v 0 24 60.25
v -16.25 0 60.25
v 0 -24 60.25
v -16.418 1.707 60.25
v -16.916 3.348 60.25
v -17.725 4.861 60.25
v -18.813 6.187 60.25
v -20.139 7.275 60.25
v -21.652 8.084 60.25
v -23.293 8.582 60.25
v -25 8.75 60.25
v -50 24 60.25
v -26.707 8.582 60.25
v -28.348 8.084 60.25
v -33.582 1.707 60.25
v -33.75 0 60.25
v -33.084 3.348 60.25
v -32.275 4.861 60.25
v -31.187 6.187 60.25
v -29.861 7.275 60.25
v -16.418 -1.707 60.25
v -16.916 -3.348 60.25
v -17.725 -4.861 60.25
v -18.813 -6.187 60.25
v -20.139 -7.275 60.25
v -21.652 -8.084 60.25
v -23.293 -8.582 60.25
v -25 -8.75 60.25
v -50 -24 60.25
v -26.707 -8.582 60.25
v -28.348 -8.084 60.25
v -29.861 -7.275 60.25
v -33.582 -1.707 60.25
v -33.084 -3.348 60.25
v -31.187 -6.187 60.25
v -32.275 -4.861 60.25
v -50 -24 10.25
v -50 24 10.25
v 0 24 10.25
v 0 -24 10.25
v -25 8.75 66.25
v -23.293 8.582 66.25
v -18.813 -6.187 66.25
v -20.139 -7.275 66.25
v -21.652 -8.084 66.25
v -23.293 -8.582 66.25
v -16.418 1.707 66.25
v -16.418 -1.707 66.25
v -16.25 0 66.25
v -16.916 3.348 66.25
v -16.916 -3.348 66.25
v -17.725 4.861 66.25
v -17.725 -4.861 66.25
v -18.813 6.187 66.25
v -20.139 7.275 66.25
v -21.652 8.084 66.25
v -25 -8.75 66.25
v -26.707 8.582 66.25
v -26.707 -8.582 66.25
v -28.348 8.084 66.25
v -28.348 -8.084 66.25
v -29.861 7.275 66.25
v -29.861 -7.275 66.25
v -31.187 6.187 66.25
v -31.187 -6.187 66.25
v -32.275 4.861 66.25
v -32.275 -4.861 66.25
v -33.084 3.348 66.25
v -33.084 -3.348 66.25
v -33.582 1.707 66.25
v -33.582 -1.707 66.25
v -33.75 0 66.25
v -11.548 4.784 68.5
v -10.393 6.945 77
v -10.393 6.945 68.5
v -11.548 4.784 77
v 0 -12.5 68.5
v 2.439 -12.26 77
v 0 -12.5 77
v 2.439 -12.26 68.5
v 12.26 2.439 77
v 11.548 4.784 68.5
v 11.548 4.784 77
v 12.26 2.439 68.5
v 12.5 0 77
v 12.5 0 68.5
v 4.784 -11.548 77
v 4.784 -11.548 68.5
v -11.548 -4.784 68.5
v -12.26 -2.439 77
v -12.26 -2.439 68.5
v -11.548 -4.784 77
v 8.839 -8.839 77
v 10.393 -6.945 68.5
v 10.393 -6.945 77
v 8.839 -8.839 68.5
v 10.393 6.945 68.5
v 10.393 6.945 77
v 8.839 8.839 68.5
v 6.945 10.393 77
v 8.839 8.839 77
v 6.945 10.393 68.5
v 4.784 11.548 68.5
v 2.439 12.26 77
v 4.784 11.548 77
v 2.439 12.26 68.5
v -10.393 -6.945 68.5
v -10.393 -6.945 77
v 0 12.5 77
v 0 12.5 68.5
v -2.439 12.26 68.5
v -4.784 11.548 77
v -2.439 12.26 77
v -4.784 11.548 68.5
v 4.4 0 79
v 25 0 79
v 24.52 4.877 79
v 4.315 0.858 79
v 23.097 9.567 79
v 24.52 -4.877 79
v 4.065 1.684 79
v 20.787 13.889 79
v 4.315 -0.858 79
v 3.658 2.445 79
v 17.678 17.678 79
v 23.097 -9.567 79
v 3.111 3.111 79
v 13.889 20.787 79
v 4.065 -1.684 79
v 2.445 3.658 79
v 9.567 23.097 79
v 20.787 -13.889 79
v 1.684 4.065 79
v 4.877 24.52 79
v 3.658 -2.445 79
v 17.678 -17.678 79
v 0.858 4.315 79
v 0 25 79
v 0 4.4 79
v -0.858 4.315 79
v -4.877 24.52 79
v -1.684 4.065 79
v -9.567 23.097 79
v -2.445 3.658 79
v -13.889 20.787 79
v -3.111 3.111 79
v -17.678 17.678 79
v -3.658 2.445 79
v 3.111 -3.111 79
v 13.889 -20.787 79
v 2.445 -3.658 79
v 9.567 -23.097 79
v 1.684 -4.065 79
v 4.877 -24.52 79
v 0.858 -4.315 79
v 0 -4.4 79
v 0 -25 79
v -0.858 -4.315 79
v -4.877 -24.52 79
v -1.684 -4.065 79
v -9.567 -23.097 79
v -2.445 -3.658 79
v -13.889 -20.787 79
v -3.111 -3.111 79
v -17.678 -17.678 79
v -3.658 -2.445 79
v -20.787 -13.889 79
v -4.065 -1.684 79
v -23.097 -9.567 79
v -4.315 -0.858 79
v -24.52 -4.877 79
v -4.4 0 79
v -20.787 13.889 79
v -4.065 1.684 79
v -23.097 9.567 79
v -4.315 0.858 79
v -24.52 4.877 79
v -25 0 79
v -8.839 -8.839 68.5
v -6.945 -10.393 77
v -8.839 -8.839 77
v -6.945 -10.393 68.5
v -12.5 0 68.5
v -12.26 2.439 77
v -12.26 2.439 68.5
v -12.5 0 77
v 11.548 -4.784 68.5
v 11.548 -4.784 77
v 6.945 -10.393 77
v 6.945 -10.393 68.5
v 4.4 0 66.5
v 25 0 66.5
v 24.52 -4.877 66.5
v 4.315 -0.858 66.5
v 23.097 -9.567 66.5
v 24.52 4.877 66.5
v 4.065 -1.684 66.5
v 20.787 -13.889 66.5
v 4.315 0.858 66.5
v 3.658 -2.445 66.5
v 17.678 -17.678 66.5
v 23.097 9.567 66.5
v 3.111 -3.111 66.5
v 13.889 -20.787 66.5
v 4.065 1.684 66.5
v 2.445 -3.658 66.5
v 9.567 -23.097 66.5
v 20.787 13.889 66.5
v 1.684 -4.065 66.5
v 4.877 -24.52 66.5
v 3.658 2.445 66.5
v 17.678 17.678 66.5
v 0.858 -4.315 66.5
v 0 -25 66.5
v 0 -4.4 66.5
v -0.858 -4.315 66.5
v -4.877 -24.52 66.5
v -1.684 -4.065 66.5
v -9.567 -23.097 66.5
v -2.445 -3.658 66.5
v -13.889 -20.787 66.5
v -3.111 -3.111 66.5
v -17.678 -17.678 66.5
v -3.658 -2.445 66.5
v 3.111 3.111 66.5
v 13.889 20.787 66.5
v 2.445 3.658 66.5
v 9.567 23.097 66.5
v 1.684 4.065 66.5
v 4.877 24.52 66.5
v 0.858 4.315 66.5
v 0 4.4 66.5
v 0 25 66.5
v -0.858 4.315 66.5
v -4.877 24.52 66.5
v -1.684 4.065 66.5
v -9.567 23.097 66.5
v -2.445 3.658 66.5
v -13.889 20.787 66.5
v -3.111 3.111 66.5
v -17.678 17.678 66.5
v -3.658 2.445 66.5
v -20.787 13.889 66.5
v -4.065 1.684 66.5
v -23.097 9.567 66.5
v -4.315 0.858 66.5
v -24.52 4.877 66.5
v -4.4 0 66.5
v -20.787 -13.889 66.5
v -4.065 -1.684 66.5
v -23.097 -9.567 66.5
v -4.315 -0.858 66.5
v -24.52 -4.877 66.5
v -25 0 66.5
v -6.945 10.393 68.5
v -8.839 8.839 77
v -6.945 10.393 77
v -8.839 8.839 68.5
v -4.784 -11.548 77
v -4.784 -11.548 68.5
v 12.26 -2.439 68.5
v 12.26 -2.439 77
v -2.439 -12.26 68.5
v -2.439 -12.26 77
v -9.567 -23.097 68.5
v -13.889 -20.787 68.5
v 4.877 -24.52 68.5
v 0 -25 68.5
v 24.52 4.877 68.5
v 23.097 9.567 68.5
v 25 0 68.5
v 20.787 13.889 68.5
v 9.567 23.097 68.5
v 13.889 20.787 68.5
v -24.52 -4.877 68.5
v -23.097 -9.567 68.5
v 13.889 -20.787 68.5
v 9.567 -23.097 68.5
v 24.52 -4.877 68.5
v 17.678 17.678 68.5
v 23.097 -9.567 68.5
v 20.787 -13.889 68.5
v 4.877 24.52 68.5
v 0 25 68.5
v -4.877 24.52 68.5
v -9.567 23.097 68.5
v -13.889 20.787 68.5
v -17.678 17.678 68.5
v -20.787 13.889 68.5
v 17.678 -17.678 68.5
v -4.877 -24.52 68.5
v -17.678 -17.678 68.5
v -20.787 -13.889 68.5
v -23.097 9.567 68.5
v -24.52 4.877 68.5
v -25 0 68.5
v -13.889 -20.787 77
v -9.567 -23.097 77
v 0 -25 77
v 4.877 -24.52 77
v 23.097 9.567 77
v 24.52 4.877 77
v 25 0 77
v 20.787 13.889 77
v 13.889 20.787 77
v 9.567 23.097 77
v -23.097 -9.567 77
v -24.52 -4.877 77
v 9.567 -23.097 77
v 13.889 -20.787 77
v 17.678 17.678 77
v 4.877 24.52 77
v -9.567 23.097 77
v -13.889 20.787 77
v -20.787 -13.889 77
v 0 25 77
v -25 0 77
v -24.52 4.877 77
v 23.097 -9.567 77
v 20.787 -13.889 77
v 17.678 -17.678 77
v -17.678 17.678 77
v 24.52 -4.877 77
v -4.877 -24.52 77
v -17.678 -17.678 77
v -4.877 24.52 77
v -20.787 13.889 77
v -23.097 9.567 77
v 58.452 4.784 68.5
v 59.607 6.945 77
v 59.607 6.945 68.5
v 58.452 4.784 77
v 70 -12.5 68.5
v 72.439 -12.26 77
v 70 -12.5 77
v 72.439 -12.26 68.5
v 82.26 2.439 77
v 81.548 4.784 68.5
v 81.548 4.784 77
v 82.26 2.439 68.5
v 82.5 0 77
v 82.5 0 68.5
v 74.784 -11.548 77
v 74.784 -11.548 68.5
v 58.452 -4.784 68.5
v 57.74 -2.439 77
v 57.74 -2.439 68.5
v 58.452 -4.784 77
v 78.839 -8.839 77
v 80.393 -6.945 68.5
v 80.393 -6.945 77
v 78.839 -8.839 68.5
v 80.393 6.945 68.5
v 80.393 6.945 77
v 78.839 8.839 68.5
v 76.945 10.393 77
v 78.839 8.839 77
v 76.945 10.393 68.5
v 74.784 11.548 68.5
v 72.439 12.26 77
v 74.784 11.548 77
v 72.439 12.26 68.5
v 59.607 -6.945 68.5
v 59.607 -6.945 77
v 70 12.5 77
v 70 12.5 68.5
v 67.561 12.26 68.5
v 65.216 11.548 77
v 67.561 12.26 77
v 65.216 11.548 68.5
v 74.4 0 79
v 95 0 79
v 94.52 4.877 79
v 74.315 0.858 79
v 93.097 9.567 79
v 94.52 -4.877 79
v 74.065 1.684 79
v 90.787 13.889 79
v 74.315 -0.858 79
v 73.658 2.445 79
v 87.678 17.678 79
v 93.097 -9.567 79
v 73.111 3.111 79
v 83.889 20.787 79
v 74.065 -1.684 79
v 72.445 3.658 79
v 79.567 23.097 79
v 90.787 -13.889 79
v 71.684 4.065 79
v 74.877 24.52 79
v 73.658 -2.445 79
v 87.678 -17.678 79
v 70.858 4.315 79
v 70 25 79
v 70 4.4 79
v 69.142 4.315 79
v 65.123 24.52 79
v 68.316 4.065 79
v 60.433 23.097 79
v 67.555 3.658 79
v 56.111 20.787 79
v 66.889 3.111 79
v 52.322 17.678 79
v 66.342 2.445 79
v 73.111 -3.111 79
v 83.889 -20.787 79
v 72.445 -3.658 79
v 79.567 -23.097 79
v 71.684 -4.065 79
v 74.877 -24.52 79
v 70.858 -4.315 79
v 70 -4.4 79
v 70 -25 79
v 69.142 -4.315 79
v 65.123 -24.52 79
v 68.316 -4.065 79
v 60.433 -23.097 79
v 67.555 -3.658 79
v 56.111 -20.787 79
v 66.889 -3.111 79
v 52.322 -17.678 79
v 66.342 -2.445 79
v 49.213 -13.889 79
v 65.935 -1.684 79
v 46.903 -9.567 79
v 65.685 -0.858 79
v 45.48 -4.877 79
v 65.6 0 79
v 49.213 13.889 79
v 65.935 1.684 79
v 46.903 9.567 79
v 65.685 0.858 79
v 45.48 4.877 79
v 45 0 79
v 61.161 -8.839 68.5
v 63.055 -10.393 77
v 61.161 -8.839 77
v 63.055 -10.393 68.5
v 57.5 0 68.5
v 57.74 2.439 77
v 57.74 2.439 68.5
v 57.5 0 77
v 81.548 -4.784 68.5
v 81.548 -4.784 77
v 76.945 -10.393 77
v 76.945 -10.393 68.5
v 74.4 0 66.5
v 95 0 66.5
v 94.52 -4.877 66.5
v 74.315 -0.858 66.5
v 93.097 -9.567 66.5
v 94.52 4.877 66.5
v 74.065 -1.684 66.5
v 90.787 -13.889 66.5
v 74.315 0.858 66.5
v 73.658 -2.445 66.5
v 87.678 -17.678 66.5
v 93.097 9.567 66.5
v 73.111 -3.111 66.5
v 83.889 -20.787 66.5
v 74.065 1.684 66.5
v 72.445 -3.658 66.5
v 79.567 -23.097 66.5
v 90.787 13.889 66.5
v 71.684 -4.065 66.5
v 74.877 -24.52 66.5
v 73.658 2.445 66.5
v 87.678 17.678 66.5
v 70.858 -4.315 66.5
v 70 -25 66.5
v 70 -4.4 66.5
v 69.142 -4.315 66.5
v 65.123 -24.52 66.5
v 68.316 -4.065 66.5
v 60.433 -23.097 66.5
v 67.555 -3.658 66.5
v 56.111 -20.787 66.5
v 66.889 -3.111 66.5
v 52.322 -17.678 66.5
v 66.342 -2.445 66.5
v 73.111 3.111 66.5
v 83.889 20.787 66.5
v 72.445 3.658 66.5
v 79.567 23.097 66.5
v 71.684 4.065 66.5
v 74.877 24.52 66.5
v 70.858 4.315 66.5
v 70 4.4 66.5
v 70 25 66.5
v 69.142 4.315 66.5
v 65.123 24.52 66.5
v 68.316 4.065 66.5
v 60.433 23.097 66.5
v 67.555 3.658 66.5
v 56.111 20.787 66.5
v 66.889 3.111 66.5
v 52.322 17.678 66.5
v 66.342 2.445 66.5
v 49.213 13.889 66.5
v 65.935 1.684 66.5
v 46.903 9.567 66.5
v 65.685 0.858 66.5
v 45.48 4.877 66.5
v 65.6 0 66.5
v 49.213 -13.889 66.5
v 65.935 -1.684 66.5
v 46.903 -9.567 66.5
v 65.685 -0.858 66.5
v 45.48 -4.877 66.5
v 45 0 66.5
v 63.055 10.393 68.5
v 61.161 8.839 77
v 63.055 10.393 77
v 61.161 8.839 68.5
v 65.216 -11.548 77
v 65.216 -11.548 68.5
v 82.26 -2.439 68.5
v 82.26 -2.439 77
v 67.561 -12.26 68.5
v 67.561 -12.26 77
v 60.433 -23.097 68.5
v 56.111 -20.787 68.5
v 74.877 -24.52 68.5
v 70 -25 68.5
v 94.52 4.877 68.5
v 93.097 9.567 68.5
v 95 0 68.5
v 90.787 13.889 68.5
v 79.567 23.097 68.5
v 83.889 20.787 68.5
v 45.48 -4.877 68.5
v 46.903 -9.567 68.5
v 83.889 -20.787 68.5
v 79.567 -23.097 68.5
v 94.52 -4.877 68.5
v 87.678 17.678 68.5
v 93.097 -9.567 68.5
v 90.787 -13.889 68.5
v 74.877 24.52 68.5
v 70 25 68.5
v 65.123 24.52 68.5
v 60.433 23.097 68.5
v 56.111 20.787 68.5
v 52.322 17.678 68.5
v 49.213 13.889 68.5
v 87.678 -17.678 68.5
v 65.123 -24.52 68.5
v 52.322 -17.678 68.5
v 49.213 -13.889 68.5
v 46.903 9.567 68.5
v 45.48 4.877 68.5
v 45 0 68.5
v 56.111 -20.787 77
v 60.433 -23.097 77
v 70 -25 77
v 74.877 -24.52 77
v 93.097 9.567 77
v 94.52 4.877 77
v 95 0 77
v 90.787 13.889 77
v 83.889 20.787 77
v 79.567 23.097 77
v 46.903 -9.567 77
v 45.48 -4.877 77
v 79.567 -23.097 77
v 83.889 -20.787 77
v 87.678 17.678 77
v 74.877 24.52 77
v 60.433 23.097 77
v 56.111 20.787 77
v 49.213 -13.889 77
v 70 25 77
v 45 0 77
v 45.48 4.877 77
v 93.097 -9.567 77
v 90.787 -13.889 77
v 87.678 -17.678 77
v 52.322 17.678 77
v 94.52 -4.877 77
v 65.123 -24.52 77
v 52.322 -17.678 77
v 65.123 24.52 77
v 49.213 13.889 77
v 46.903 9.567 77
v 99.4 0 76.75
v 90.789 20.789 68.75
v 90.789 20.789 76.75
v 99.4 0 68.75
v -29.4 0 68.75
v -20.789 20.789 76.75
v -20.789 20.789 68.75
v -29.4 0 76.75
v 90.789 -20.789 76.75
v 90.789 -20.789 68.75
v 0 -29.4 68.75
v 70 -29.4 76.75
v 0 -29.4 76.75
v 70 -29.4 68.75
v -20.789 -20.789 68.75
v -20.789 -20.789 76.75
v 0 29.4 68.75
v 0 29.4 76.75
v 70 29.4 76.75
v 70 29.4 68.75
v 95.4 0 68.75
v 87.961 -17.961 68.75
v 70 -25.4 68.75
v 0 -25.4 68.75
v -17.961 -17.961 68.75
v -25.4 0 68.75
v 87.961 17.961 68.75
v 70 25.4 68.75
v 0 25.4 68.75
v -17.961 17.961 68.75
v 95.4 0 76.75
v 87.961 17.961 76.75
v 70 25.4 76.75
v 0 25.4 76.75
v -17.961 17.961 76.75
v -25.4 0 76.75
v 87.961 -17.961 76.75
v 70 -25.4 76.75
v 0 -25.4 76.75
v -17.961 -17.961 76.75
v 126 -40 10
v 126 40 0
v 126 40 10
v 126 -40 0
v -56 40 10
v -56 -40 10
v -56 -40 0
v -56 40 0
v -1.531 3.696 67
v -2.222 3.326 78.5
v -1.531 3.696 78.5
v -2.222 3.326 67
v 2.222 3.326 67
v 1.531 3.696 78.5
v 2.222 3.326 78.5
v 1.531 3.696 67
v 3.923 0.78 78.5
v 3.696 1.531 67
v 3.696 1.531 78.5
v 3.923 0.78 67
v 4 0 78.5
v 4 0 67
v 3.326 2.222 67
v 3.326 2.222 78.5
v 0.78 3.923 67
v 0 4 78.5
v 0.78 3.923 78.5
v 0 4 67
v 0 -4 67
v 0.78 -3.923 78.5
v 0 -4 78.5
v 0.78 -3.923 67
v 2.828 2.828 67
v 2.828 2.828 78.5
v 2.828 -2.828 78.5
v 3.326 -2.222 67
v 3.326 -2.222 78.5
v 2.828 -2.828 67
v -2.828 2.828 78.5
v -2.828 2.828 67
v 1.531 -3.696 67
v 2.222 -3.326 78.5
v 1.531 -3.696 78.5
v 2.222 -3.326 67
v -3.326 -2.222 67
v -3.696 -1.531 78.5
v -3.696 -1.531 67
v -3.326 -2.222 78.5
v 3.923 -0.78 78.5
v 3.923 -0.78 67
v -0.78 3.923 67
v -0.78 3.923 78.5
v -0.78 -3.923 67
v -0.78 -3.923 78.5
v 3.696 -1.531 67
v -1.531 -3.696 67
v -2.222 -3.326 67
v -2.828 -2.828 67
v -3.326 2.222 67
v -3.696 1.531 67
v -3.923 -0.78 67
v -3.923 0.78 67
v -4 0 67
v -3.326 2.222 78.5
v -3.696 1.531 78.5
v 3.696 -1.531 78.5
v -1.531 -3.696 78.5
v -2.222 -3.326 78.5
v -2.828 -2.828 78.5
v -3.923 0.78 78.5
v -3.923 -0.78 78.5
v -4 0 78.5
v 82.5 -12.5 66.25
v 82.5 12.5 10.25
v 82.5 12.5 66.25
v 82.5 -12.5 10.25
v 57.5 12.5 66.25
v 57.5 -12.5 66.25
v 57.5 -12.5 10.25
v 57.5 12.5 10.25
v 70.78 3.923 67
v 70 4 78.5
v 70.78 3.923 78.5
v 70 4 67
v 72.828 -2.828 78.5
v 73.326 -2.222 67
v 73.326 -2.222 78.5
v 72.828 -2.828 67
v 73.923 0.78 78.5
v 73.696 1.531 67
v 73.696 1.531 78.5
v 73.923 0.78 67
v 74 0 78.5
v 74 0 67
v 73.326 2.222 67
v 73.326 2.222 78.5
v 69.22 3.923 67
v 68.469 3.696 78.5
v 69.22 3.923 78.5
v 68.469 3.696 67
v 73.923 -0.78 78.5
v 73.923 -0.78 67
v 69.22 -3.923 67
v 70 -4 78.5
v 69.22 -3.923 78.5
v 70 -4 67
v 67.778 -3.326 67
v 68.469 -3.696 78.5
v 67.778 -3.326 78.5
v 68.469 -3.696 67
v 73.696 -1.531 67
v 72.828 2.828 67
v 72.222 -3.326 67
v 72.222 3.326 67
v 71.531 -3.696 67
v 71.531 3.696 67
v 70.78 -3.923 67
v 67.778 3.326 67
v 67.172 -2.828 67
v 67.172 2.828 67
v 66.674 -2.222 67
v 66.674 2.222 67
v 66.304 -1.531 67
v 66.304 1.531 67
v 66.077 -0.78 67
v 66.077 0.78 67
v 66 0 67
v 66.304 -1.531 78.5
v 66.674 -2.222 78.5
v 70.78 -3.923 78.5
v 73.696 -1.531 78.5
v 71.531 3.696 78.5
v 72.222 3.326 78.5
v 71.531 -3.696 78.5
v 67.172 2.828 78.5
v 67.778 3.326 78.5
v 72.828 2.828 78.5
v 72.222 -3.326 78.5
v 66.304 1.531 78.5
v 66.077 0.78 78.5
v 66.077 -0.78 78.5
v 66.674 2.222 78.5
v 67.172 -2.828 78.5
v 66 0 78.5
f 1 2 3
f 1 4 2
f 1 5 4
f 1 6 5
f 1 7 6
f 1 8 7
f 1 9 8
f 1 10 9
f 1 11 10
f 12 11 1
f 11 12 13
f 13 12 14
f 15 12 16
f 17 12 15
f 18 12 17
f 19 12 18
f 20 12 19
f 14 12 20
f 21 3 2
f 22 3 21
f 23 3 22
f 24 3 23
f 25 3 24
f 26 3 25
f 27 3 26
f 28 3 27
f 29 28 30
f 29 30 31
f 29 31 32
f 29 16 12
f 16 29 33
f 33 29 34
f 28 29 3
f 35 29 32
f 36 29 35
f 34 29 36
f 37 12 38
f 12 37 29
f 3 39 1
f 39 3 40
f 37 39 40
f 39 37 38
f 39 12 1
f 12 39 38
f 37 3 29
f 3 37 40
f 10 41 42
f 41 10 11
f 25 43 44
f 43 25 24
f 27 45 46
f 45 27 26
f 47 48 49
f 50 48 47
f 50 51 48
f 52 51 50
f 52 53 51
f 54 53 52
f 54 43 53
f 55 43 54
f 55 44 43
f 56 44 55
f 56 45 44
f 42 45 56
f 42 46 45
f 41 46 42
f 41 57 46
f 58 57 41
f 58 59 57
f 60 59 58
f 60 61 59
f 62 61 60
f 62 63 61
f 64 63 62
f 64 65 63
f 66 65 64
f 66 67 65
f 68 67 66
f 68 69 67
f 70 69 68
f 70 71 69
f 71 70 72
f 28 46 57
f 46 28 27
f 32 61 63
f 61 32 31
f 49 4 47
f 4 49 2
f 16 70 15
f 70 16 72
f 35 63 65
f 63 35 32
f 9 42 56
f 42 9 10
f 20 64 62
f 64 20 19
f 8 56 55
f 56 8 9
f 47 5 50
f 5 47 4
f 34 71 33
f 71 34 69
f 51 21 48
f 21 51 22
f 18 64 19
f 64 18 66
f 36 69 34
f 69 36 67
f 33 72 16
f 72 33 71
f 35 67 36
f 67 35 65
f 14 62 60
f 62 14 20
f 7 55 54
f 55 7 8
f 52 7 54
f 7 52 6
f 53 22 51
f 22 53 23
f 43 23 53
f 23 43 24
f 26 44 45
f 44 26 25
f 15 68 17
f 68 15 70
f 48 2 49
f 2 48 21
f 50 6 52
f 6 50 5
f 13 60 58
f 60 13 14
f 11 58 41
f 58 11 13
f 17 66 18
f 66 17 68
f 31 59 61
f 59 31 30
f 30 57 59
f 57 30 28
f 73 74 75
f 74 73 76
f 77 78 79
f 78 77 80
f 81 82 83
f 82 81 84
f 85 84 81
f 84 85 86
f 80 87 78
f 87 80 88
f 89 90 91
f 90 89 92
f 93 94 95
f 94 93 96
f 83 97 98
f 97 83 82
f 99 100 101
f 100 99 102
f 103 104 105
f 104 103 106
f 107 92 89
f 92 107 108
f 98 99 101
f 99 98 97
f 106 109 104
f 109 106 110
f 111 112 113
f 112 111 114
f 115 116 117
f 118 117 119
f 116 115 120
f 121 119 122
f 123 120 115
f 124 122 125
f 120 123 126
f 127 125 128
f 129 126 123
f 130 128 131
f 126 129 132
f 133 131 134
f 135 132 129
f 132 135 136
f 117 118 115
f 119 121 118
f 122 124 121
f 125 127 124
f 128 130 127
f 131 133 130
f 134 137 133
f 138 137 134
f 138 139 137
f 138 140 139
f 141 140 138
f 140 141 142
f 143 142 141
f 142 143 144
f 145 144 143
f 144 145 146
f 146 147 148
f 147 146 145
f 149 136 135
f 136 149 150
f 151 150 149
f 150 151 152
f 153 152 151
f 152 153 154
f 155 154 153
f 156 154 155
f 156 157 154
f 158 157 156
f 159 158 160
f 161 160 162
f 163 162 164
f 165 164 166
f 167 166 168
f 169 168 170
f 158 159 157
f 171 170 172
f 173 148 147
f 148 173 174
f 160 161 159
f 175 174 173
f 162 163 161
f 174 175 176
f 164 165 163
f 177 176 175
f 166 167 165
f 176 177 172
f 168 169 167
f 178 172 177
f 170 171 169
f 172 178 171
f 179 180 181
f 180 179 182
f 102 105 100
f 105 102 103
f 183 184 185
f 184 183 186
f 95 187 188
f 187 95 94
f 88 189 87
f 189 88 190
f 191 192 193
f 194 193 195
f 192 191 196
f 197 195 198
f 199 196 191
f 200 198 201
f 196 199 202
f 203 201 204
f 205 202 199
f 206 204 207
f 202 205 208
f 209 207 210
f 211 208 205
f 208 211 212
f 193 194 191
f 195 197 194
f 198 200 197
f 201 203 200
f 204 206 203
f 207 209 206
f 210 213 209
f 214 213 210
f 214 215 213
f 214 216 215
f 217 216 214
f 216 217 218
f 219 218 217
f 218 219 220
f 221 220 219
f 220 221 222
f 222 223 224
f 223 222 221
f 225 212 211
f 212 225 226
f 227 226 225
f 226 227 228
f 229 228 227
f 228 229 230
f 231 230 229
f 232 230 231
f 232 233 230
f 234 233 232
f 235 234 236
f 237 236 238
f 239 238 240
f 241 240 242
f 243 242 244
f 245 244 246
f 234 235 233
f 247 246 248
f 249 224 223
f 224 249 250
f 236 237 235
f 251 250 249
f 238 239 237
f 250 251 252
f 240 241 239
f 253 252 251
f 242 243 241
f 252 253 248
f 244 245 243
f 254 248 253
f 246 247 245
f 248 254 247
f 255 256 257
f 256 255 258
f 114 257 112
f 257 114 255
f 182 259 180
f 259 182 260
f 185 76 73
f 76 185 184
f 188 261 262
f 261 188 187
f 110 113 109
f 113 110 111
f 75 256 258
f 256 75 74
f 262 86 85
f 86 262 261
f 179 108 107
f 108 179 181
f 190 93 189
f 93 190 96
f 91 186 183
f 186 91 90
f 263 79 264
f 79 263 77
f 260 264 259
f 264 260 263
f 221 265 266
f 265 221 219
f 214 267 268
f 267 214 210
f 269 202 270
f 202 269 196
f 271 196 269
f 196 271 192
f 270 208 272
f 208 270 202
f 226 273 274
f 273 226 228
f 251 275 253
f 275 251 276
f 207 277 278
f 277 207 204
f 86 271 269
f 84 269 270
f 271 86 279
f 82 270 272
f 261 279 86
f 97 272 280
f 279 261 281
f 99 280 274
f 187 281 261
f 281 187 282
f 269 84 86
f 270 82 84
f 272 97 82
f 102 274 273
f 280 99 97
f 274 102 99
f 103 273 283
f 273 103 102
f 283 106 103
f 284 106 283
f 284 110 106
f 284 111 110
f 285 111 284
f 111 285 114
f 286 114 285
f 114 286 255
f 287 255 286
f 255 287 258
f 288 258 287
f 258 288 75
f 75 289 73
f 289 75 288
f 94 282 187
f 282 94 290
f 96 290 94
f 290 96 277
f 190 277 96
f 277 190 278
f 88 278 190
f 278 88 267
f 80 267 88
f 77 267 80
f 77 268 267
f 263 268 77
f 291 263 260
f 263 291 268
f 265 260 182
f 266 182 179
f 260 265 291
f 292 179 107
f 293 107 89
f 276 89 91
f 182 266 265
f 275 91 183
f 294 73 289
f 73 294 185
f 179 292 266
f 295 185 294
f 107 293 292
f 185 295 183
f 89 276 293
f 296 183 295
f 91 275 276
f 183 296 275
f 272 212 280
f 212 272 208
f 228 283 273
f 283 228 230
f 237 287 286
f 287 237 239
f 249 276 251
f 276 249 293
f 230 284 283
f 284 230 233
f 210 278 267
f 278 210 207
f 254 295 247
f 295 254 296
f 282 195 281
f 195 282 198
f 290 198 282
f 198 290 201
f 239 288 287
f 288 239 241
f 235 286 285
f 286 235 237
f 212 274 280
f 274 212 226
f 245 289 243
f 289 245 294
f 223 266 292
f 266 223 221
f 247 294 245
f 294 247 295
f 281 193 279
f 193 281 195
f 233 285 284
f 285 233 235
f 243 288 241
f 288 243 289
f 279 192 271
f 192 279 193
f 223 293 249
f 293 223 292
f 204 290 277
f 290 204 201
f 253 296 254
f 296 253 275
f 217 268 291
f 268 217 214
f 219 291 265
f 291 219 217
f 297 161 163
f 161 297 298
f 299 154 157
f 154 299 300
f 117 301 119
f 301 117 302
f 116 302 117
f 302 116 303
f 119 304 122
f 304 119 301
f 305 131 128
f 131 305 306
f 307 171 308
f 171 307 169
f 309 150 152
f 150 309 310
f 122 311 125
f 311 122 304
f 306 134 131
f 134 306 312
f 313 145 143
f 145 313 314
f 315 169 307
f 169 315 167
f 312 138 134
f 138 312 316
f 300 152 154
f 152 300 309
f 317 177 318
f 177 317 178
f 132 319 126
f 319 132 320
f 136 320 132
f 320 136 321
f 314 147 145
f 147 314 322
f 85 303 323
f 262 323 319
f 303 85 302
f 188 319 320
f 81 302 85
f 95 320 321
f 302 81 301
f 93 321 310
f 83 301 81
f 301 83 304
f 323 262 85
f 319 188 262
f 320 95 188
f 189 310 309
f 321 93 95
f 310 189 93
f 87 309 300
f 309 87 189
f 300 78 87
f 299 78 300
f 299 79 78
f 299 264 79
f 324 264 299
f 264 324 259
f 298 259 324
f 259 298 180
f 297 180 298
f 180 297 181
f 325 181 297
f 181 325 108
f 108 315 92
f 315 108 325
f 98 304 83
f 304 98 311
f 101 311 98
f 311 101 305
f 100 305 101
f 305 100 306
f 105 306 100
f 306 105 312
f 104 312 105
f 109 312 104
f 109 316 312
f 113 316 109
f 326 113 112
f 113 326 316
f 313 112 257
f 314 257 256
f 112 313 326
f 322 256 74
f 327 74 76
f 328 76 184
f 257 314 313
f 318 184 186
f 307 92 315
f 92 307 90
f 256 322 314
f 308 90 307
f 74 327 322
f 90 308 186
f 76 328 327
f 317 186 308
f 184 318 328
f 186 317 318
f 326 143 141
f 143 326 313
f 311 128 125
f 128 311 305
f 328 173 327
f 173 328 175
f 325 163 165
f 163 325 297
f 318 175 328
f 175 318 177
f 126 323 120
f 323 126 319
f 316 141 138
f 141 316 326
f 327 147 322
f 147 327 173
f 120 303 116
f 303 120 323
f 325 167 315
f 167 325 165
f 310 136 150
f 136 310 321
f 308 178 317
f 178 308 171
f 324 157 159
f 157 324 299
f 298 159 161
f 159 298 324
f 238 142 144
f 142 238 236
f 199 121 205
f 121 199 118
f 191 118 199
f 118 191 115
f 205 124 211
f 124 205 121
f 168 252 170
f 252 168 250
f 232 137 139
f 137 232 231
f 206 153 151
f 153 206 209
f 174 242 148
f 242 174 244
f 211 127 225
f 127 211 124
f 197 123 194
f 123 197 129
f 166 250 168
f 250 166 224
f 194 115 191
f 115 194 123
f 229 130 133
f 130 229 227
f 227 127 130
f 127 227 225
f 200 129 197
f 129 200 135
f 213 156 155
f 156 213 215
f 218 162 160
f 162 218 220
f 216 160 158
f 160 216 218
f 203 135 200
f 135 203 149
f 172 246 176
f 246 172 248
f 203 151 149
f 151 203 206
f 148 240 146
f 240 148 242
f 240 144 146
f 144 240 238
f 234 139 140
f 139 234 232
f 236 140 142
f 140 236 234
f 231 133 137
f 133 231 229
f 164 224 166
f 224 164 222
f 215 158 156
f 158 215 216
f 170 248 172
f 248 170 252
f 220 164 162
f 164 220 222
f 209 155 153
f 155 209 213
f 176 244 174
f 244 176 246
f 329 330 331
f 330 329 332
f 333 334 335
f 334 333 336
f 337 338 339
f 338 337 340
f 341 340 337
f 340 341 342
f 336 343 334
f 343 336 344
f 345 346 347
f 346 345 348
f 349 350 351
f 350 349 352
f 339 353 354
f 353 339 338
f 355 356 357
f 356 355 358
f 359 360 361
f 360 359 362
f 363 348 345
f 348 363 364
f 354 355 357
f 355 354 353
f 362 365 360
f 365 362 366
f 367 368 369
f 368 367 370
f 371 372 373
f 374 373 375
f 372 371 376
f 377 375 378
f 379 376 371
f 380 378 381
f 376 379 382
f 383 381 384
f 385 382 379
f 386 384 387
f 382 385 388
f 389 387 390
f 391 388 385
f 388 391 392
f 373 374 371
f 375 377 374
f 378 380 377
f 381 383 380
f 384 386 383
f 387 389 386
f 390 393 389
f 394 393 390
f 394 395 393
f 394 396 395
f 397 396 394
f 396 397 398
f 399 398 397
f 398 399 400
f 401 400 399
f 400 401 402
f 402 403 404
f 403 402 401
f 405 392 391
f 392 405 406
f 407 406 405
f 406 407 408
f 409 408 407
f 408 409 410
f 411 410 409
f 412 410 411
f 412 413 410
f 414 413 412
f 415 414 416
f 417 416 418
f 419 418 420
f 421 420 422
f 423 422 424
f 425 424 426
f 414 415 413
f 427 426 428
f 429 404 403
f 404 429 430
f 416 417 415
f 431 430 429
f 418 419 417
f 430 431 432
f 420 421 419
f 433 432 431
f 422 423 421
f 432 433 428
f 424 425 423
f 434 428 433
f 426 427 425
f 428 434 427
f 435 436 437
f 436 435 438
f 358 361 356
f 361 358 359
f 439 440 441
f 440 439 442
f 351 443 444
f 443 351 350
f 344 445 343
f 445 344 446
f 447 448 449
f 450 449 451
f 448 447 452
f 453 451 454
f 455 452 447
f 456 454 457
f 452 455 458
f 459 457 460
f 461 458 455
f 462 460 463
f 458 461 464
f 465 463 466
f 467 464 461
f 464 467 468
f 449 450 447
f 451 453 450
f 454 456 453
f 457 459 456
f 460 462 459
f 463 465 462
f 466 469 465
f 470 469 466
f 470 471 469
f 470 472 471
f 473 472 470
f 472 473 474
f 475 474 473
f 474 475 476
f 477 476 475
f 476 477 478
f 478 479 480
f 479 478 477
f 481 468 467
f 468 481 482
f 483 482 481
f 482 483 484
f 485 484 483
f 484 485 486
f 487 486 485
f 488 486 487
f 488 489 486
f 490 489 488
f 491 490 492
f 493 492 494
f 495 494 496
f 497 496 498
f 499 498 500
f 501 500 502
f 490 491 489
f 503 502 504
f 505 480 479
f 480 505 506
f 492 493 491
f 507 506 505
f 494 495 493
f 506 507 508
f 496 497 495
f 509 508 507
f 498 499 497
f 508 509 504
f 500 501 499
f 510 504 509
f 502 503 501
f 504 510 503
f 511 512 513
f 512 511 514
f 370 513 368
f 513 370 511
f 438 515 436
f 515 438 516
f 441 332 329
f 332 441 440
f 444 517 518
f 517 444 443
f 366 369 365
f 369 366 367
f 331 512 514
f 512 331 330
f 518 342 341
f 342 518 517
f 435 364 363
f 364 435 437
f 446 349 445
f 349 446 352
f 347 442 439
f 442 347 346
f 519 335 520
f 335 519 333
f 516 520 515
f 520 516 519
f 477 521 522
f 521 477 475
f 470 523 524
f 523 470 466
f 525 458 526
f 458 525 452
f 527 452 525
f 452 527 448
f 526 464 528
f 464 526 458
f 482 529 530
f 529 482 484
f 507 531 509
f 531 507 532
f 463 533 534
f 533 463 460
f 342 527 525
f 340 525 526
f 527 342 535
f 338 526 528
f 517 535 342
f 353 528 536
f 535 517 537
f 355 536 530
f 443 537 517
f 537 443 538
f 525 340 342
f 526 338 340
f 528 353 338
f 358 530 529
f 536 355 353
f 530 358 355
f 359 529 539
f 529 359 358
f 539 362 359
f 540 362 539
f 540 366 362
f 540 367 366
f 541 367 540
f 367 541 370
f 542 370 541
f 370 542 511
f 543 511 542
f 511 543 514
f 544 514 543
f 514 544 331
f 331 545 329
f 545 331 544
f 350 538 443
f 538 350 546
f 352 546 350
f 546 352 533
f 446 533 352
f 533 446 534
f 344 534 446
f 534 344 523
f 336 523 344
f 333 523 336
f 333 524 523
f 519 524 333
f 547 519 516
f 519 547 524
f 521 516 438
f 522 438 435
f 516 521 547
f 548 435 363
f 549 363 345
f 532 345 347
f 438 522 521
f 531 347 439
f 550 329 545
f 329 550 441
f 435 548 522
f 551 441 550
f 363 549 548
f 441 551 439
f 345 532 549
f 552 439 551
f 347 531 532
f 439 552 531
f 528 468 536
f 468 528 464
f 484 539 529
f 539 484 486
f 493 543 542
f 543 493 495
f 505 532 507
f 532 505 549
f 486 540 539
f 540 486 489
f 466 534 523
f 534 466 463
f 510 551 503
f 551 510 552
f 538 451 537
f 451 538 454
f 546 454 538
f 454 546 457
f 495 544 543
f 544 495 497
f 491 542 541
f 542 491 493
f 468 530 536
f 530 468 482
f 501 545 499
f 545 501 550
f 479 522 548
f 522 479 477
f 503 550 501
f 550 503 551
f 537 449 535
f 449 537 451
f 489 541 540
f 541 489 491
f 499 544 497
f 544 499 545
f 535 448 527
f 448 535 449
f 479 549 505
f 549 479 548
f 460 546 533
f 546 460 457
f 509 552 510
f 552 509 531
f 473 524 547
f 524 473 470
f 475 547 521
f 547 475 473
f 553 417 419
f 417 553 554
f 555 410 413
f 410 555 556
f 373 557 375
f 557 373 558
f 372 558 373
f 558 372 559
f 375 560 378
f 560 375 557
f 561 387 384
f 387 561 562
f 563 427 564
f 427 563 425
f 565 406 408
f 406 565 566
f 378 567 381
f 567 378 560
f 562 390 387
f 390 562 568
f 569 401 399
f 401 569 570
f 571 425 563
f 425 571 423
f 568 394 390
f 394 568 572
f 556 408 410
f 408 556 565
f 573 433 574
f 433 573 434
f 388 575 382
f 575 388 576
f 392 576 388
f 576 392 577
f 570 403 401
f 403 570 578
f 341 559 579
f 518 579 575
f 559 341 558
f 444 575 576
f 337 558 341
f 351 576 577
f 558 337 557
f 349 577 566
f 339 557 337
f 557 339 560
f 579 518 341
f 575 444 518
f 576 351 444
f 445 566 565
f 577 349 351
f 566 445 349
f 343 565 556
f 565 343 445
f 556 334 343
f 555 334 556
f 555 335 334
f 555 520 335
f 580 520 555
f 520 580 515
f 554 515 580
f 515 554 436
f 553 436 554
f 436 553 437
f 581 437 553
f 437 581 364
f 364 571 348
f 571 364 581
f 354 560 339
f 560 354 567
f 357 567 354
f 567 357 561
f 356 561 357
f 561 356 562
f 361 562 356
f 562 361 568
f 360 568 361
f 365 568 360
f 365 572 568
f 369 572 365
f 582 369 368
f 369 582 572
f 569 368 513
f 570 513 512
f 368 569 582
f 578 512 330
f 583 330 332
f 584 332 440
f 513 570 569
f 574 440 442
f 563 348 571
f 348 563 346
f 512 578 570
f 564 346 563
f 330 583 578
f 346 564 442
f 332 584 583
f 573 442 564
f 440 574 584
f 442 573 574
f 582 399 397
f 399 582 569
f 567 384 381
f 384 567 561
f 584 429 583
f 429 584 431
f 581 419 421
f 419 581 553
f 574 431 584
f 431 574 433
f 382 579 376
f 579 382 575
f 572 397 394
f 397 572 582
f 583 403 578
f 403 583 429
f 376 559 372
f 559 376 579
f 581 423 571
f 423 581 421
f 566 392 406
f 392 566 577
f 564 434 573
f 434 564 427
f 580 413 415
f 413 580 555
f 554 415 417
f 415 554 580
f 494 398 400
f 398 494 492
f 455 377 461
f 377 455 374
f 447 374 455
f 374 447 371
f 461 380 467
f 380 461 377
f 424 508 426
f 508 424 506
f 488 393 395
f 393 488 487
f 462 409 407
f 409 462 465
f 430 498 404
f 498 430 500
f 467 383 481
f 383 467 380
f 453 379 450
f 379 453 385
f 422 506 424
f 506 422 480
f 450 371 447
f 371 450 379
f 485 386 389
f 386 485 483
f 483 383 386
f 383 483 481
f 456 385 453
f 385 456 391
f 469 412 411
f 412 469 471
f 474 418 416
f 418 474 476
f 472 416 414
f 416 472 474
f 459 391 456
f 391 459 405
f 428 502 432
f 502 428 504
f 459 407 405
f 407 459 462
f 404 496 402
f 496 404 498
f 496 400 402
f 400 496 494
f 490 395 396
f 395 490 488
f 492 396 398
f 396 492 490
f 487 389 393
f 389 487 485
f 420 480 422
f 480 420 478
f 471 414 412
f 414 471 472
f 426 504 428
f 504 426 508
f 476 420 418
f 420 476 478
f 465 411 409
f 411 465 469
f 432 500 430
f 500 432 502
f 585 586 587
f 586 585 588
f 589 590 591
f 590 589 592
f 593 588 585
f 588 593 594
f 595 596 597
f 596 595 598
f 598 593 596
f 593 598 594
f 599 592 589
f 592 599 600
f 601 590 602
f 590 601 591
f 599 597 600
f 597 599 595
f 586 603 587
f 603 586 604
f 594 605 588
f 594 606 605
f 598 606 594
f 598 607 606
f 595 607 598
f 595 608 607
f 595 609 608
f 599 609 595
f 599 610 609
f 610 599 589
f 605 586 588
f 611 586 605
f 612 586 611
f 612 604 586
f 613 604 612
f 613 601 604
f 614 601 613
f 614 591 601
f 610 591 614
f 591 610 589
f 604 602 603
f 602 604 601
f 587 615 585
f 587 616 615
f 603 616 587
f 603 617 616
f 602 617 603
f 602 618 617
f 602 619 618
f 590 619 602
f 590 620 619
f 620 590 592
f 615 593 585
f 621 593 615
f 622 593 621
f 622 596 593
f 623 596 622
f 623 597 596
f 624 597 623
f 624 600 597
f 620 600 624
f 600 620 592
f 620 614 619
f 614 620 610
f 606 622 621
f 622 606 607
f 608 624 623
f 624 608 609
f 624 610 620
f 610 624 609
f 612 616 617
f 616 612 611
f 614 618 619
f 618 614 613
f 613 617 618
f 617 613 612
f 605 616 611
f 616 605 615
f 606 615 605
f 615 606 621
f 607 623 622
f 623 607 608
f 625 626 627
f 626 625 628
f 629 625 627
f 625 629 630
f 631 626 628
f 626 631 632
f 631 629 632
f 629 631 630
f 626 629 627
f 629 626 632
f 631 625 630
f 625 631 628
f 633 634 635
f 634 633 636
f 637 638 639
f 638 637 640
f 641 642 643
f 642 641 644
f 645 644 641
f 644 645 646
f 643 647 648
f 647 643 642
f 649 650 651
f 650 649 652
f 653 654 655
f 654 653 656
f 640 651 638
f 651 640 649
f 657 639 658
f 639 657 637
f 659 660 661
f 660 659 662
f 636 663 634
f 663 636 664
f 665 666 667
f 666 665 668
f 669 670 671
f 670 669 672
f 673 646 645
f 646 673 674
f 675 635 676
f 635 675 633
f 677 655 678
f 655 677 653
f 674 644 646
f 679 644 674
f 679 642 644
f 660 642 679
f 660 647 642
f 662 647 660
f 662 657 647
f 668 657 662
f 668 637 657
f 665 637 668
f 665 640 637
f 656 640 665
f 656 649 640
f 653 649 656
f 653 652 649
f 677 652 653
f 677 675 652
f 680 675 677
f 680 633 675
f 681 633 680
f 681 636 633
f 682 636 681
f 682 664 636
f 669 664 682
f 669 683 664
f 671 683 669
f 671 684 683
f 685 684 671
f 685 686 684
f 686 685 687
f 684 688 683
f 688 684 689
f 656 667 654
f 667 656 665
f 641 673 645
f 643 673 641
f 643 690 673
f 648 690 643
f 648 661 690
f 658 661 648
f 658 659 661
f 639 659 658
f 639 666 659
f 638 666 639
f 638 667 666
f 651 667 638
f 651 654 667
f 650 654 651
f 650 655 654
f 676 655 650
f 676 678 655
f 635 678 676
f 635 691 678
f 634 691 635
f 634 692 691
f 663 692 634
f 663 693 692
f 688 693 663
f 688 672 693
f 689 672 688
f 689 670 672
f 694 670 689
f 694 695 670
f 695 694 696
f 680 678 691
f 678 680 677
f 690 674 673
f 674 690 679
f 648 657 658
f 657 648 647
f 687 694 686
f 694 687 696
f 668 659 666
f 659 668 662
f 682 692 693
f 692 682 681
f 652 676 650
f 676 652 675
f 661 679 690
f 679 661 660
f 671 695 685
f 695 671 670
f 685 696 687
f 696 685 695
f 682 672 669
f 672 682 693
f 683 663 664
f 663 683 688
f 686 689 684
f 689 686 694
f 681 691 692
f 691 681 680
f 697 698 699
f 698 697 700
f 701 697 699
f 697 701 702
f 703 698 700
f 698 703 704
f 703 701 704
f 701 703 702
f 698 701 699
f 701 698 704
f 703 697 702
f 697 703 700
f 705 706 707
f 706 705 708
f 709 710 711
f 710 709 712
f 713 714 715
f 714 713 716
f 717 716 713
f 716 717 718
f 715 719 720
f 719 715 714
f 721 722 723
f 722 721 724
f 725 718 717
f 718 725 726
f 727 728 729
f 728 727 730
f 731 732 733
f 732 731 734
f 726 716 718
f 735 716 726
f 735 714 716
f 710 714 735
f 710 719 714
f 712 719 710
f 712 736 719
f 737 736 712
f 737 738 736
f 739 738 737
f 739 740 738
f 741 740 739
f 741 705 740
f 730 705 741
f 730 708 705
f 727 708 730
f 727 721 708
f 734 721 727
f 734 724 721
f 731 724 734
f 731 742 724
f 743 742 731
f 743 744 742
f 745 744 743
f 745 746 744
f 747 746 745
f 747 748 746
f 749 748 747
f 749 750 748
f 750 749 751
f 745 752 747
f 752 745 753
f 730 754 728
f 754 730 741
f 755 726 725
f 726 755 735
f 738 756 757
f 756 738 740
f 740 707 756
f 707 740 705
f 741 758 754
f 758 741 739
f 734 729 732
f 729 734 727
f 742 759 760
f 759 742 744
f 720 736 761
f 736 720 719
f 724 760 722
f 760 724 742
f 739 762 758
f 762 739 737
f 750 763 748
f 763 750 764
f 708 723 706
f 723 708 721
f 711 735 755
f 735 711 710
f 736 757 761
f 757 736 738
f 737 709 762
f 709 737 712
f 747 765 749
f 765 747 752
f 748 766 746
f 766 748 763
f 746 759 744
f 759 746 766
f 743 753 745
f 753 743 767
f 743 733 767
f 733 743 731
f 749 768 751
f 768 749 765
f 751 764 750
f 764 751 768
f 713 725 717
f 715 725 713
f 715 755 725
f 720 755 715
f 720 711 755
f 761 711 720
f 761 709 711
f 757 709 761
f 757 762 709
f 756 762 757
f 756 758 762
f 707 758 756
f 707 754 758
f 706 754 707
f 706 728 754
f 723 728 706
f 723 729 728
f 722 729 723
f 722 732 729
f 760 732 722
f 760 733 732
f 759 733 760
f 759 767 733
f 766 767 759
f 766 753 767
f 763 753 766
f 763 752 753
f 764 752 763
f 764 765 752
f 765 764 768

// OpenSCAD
$fn = 32;

// ------------------------------------------------------------------------
// Motor belt drive: span 70 mm, pulleys d50, belt 8 mm wide
// Every part is its own module, assembly() places every instance.
// ------------------------------------------------------------------------

// --- part 1 ---
module base_plate() {
  difference() {
    translate([-91, -40, 0]) cube([182, 80, 10]);
  }
}

// --- part 2 ---
module motor() {
  union() {
    translate([-25, -24, 0]) cube([50, 48, 50]);
    translate([28, 0, 25]) rotate([0, 90, 0]) cylinder(h = 6, d = 17.5, center = true);
  }
}

// --- part 3 ---
module drive_shaft() {
  translate([0, 0, -5.75]) cylinder(h = 11.5, d = 8);
}

// --- part 4 ---
module pulley_drive() {
  difference() {
    union() {
      cylinder(h = 12.5, d = 25);
      cylinder(h = 2, d = 50);
      translate([0, 0, 10.5]) cylinder(h = 2, d = 50);
    }
    translate([0, 0, -1]) cylinder(h = 14.5, d = 8.8);
  }
}

// --- part 5 ---
module idler_post() {
  translate([-12.5, -12.5, 0]) cube([25, 25, 56]);
}

// --- part 6 ---
module driven_shaft() {
  translate([0, 0, -5.75]) cylinder(h = 11.5, d = 8);
}

// --- part 7 ---
module pulley_driven() {
  difference() {
    union() {
      cylinder(h = 12.5, d = 25);
      cylinder(h = 2, d = 50);
      translate([0, 0, 10.5]) cylinder(h = 2, d = 50);
    }
    translate([0, 0, -1]) cylinder(h = 14.5, d = 8.8);
  }
}

// --- part 8 ---
module drive_belt() {
  difference() {
    linear_extrude(height = 8) polygon(points = concat([for (a = [90 : 45 : 270]) [29.4 * cos(a), 29.4 * sin(a)]], [for (a = [270 : 45 : 450]) [70 + 29.4 * cos(a), 29.4 * sin(a)]]));
    translate([0, 0, -1]) linear_extrude(height = 10) polygon(points = concat([for (a = [90 : 45 : 270]) [25.4 * cos(a), 25.4 * sin(a)]], [for (a = [270 : 45 : 450]) [70 + 25.4 * cos(a), 25.4 * sin(a)]]));
  }
}

// --- assembly ---
module assembly() {
  color([0.80, 0.24, 0.20]) translate([35, 0, 0]) rotate([0, 0, 0]) base_plate();
  color([0.20, 0.45, 0.75]) translate([0, 0, 35.25]) rotate([0, 270, 0]) motor();
  color([0.25, 0.62, 0.32]) translate([0, 0, 72.75]) rotate([0, 0, 0]) drive_shaft();
  color([0.92, 0.70, 0.18]) translate([0, 0, 66.5]) rotate([0, 0, 0]) pulley_drive();
  color([0.58, 0.35, 0.70]) translate([70, 0, 10.25]) rotate([0, 0, 0]) idler_post();
  color([0.16, 0.66, 0.66]) translate([70, 0, 72.75]) rotate([0, 0, 0]) driven_shaft();
  color([0.85, 0.48, 0.18]) translate([70, 0, 66.5]) rotate([0, 0, 0]) pulley_driven();
  color([0.55, 0.60, 0.65]) translate([0, 0, 68.75]) rotate([0, 0, 0]) drive_belt();
}

assembly();
